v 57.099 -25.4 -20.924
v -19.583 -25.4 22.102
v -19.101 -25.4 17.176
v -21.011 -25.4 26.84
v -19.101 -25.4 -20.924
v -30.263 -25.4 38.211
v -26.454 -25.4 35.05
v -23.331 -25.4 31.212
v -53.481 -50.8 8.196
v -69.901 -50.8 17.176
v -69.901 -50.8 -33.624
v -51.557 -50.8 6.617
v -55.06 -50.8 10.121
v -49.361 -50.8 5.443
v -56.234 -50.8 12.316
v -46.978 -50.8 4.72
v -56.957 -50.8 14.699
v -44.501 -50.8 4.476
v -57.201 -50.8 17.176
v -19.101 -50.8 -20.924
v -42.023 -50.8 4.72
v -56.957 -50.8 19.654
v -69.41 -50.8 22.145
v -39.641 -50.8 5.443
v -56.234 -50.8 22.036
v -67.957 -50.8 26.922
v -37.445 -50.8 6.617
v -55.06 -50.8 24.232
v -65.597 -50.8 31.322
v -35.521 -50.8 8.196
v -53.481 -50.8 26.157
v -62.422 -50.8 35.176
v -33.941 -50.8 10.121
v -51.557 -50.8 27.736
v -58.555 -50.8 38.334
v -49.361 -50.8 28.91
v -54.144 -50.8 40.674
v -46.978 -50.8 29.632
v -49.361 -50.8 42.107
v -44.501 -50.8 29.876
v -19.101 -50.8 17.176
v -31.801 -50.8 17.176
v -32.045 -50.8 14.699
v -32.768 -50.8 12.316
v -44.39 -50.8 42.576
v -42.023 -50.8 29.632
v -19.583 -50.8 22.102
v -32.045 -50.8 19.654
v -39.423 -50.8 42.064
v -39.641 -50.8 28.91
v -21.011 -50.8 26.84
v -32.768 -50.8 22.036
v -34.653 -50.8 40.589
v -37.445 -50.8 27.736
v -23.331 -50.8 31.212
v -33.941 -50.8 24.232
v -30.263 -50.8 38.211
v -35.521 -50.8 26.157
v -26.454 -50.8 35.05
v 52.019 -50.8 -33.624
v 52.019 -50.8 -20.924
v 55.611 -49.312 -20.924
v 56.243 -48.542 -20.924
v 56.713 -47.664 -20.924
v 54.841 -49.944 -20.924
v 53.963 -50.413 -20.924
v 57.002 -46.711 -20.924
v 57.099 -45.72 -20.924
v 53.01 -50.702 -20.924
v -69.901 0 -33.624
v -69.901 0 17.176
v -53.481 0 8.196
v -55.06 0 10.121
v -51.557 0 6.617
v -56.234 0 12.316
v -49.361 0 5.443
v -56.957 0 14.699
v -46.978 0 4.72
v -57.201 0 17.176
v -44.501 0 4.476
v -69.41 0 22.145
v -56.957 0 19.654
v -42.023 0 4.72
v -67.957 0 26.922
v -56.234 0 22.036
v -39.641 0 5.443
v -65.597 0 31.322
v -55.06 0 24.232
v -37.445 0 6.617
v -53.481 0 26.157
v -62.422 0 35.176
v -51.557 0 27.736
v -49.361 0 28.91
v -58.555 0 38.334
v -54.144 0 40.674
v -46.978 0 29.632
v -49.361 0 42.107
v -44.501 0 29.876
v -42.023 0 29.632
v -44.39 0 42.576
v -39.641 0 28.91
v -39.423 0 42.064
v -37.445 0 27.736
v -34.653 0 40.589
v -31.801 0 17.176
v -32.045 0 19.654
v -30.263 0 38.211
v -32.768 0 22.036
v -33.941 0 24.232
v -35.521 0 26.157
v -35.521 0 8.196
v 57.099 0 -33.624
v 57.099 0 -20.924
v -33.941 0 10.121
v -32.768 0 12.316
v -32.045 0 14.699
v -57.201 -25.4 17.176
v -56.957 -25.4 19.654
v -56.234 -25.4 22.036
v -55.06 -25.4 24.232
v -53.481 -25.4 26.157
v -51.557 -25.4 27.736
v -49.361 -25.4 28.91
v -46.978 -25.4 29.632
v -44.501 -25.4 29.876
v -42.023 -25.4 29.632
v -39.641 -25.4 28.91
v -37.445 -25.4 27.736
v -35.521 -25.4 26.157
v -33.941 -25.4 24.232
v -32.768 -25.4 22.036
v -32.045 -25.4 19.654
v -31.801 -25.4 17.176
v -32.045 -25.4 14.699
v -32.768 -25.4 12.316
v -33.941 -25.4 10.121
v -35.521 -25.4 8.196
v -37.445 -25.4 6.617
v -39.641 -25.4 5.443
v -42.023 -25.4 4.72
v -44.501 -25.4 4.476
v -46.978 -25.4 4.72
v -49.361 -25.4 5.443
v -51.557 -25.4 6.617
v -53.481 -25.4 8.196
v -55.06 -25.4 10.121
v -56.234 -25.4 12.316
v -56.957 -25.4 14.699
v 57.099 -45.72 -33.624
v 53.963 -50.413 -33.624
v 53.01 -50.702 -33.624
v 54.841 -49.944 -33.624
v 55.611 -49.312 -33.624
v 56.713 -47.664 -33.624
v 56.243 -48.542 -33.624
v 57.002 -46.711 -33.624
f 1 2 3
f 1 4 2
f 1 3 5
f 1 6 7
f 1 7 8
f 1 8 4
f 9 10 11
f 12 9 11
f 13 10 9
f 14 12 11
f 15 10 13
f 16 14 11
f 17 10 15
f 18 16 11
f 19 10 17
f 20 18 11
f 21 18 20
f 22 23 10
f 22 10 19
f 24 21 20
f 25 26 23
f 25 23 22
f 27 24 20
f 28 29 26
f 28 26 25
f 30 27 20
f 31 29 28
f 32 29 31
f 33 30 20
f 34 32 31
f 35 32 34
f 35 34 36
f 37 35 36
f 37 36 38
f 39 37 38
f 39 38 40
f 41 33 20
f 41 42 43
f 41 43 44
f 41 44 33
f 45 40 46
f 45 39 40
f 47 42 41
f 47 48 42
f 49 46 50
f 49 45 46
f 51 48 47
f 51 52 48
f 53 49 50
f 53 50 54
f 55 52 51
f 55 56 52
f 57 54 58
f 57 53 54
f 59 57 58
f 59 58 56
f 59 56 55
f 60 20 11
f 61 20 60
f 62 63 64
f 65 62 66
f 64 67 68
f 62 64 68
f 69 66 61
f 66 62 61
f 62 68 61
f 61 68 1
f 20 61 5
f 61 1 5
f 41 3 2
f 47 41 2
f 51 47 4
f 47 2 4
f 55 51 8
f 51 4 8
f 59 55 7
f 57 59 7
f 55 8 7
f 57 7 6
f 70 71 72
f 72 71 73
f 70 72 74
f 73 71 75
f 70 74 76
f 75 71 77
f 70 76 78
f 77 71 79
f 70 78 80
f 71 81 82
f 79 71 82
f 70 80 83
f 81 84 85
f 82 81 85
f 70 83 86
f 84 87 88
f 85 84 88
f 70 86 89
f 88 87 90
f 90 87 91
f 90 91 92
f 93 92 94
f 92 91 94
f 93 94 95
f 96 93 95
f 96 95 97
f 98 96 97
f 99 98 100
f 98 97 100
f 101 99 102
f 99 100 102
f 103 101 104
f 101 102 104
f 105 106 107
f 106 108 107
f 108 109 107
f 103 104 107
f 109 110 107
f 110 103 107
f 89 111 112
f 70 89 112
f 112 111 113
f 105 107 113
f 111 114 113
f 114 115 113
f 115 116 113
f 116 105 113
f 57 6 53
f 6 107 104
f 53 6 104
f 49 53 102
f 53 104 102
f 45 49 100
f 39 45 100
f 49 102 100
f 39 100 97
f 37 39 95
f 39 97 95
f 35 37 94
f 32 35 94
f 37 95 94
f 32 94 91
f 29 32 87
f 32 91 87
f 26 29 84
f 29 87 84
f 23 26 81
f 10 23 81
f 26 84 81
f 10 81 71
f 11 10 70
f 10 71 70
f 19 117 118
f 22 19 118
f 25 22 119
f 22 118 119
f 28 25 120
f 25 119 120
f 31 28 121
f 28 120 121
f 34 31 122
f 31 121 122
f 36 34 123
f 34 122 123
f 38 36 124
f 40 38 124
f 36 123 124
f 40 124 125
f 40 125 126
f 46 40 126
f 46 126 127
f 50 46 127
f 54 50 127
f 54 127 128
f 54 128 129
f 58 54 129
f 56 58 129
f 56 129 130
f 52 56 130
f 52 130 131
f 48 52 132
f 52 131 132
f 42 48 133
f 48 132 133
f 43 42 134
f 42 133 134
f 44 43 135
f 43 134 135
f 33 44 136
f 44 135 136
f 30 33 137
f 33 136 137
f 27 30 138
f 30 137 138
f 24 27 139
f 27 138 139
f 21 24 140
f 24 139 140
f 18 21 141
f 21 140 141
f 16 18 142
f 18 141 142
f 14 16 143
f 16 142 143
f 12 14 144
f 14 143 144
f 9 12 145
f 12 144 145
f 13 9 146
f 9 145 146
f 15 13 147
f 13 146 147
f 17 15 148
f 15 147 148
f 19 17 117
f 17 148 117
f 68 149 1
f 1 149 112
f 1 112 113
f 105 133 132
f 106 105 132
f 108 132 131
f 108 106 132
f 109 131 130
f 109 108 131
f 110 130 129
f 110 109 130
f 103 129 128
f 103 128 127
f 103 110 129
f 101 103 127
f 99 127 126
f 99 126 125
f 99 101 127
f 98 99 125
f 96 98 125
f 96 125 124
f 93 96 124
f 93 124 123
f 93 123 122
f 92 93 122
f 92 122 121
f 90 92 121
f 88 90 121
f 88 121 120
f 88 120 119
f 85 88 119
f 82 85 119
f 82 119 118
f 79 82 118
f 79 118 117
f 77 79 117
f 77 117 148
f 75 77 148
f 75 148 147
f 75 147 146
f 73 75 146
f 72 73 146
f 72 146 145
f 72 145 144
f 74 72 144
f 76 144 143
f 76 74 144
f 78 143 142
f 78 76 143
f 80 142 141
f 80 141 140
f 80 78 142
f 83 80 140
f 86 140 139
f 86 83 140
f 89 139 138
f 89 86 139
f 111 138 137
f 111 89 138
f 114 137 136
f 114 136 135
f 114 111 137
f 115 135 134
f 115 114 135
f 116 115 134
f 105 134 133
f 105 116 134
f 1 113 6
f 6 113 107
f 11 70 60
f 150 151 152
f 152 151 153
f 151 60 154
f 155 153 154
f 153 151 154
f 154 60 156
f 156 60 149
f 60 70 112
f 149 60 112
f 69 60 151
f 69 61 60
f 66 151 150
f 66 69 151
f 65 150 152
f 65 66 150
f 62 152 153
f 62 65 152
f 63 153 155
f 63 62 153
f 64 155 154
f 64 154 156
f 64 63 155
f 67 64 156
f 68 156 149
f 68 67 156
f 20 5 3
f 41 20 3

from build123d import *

# Parameters (mm, degrees)
F0_R     = 12.7
F1_DEPTH = 25.4
F3_DEPTH = 25.4
F4_R     = 5.08


with BuildPart() as f1:
    # F0 (on Front) → F1 (new body)
    with BuildSketch(Plane.XZ):
        with BuildLine():
            Line((57.099202013, -20.9237289011), (-30.2629248588, 38.2105994406))
            ThreePointArc((-30.2629248588, 38.2105994406), (-56.4070573186, 39.6128704117), (-69.900797987, 17.1762710989))
            Line((-69.900797987, 17.1762710989), (-69.900797987, -33.6237289011))
            Line((-69.900797987, -33.6237289011), (57.099202013, -33.6237289011))
            Line((57.099202013, -33.6237289011), (57.099202013, -20.9237289011))
        make_face()
        with Locations((-44.500797987, 17.1762710989)):
            Circle(F0_R, mode=Mode.SUBTRACT)
    extrude(amount=F1_DEPTH)

    # F2 (on face) → F3 (join)
    with BuildSketch(Plane.XZ.offset(25.4)):
        with BuildLine():
            Line((-19.100797987, -20.9237289011), (-19.100797987, 17.1762710989))
            Line((-19.100797987, 17.1762710989), (-31.800797987, 17.1762710989))
            ThreePointArc((-31.800797987, 17.1762710989), (-44.500797987, 4.4762710989), (-57.200797987, 17.1762710989))
            Line((-57.200797987, 17.1762710989), (-69.900797987, 17.1762710989))
            Line((-69.900797987, 17.1762710989), (-69.900797987, -20.9237289011))
            Line((-69.900797987, -20.9237289011), (-69.900797987, -33.6237289011))
            Line((-69.900797987, -33.6237289011), (57.099202013, -33.6237289011))
            Line((57.099202013, -33.6237289011), (57.099202013, -20.9237289011))
            Line((57.099202013, -20.9237289011), (-19.100797987, -20.9237289011))
        make_face()
        with BuildLine():
            Line((-31.800797987, 17.1762710989), (-19.100797987, 17.1762710989))
            ThreePointArc((-19.100797987, 17.1762710989), (-22.0641986741, 29.0825304305), (-30.2629248588, 38.2105994406))
            ThreePointArc((-30.2629248588, 38.2105994406), (-56.4070573186, 39.6128704117), (-69.900797987, 17.1762710989))
            Line((-69.900797987, 17.1762710989), (-57.200797987, 17.1762710989))
            ThreePointArc((-57.200797987, 17.1762710989), (-44.500797987, 29.8762710989), (-31.800797987, 17.1762710989))
        make_face()
    extrude(amount=F3_DEPTH)

    # F4
    f4_edges = [f1.edges().sort_by_distance(p)[0] for p in [
        (57.099202, -50.8, -27.273729),
    ]]
    fillet(f4_edges, radius=F4_R)


solid = f1.part
